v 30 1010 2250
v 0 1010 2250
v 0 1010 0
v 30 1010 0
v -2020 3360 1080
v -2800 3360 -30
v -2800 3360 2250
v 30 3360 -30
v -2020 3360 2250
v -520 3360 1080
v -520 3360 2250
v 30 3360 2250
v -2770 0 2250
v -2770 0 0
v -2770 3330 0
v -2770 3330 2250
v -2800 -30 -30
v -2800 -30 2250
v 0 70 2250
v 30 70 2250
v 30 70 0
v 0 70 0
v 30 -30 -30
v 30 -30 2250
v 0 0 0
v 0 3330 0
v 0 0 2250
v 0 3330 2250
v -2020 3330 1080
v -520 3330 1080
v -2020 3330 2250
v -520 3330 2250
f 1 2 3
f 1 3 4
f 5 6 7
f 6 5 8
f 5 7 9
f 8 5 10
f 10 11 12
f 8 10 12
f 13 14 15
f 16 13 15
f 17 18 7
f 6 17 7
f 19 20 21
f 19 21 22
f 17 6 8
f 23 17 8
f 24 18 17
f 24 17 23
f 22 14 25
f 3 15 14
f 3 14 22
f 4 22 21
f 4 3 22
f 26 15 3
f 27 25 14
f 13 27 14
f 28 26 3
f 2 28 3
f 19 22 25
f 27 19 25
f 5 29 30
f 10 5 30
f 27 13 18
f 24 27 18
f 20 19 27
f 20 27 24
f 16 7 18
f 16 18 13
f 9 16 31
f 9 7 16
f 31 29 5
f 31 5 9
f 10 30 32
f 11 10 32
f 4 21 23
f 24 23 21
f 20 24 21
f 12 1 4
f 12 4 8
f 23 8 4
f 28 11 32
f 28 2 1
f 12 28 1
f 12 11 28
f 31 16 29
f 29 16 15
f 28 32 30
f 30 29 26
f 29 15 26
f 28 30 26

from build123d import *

# Parameters (mm, degrees)
F1_DEPTH = 2250
F2_W     = 2830
F2_H     = 3390
F3_DEPTH = 30
F4_W     = 1500
F4_H     = 1170
F5_DEPTH = 30


with BuildPart() as f1:
    # F0 (on Top) → F1 (new body)
    with BuildSketch(Plane.XY):
        Polygon((0, 70), (0, 0), (-2770, 0), (-2770, 3330), (0, 3330), (0, 1010), (30, 1010), (30, 3360), (-2800, 3360), (-2800, -30), (30, -30), (30, 70), align=None)
    extrude(amount=F1_DEPTH)

    # F2 (on Top) → F3 (join)
    with BuildSketch(Plane.XY):
        with Locations((-1385, 1665)):
            Rectangle(F2_W, F2_H)
    extrude(amount=-F3_DEPTH)

    # F4 (on face) → F5 (cut, through all)
    with BuildSketch(Plane.XZ.offset(-3330)):
        with Locations((-1270, 1665)):
            Rectangle(F4_W, F4_H)
    extrude(amount=-F5_DEPTH, mode=Mode.SUBTRACT)


solid = f1.part
